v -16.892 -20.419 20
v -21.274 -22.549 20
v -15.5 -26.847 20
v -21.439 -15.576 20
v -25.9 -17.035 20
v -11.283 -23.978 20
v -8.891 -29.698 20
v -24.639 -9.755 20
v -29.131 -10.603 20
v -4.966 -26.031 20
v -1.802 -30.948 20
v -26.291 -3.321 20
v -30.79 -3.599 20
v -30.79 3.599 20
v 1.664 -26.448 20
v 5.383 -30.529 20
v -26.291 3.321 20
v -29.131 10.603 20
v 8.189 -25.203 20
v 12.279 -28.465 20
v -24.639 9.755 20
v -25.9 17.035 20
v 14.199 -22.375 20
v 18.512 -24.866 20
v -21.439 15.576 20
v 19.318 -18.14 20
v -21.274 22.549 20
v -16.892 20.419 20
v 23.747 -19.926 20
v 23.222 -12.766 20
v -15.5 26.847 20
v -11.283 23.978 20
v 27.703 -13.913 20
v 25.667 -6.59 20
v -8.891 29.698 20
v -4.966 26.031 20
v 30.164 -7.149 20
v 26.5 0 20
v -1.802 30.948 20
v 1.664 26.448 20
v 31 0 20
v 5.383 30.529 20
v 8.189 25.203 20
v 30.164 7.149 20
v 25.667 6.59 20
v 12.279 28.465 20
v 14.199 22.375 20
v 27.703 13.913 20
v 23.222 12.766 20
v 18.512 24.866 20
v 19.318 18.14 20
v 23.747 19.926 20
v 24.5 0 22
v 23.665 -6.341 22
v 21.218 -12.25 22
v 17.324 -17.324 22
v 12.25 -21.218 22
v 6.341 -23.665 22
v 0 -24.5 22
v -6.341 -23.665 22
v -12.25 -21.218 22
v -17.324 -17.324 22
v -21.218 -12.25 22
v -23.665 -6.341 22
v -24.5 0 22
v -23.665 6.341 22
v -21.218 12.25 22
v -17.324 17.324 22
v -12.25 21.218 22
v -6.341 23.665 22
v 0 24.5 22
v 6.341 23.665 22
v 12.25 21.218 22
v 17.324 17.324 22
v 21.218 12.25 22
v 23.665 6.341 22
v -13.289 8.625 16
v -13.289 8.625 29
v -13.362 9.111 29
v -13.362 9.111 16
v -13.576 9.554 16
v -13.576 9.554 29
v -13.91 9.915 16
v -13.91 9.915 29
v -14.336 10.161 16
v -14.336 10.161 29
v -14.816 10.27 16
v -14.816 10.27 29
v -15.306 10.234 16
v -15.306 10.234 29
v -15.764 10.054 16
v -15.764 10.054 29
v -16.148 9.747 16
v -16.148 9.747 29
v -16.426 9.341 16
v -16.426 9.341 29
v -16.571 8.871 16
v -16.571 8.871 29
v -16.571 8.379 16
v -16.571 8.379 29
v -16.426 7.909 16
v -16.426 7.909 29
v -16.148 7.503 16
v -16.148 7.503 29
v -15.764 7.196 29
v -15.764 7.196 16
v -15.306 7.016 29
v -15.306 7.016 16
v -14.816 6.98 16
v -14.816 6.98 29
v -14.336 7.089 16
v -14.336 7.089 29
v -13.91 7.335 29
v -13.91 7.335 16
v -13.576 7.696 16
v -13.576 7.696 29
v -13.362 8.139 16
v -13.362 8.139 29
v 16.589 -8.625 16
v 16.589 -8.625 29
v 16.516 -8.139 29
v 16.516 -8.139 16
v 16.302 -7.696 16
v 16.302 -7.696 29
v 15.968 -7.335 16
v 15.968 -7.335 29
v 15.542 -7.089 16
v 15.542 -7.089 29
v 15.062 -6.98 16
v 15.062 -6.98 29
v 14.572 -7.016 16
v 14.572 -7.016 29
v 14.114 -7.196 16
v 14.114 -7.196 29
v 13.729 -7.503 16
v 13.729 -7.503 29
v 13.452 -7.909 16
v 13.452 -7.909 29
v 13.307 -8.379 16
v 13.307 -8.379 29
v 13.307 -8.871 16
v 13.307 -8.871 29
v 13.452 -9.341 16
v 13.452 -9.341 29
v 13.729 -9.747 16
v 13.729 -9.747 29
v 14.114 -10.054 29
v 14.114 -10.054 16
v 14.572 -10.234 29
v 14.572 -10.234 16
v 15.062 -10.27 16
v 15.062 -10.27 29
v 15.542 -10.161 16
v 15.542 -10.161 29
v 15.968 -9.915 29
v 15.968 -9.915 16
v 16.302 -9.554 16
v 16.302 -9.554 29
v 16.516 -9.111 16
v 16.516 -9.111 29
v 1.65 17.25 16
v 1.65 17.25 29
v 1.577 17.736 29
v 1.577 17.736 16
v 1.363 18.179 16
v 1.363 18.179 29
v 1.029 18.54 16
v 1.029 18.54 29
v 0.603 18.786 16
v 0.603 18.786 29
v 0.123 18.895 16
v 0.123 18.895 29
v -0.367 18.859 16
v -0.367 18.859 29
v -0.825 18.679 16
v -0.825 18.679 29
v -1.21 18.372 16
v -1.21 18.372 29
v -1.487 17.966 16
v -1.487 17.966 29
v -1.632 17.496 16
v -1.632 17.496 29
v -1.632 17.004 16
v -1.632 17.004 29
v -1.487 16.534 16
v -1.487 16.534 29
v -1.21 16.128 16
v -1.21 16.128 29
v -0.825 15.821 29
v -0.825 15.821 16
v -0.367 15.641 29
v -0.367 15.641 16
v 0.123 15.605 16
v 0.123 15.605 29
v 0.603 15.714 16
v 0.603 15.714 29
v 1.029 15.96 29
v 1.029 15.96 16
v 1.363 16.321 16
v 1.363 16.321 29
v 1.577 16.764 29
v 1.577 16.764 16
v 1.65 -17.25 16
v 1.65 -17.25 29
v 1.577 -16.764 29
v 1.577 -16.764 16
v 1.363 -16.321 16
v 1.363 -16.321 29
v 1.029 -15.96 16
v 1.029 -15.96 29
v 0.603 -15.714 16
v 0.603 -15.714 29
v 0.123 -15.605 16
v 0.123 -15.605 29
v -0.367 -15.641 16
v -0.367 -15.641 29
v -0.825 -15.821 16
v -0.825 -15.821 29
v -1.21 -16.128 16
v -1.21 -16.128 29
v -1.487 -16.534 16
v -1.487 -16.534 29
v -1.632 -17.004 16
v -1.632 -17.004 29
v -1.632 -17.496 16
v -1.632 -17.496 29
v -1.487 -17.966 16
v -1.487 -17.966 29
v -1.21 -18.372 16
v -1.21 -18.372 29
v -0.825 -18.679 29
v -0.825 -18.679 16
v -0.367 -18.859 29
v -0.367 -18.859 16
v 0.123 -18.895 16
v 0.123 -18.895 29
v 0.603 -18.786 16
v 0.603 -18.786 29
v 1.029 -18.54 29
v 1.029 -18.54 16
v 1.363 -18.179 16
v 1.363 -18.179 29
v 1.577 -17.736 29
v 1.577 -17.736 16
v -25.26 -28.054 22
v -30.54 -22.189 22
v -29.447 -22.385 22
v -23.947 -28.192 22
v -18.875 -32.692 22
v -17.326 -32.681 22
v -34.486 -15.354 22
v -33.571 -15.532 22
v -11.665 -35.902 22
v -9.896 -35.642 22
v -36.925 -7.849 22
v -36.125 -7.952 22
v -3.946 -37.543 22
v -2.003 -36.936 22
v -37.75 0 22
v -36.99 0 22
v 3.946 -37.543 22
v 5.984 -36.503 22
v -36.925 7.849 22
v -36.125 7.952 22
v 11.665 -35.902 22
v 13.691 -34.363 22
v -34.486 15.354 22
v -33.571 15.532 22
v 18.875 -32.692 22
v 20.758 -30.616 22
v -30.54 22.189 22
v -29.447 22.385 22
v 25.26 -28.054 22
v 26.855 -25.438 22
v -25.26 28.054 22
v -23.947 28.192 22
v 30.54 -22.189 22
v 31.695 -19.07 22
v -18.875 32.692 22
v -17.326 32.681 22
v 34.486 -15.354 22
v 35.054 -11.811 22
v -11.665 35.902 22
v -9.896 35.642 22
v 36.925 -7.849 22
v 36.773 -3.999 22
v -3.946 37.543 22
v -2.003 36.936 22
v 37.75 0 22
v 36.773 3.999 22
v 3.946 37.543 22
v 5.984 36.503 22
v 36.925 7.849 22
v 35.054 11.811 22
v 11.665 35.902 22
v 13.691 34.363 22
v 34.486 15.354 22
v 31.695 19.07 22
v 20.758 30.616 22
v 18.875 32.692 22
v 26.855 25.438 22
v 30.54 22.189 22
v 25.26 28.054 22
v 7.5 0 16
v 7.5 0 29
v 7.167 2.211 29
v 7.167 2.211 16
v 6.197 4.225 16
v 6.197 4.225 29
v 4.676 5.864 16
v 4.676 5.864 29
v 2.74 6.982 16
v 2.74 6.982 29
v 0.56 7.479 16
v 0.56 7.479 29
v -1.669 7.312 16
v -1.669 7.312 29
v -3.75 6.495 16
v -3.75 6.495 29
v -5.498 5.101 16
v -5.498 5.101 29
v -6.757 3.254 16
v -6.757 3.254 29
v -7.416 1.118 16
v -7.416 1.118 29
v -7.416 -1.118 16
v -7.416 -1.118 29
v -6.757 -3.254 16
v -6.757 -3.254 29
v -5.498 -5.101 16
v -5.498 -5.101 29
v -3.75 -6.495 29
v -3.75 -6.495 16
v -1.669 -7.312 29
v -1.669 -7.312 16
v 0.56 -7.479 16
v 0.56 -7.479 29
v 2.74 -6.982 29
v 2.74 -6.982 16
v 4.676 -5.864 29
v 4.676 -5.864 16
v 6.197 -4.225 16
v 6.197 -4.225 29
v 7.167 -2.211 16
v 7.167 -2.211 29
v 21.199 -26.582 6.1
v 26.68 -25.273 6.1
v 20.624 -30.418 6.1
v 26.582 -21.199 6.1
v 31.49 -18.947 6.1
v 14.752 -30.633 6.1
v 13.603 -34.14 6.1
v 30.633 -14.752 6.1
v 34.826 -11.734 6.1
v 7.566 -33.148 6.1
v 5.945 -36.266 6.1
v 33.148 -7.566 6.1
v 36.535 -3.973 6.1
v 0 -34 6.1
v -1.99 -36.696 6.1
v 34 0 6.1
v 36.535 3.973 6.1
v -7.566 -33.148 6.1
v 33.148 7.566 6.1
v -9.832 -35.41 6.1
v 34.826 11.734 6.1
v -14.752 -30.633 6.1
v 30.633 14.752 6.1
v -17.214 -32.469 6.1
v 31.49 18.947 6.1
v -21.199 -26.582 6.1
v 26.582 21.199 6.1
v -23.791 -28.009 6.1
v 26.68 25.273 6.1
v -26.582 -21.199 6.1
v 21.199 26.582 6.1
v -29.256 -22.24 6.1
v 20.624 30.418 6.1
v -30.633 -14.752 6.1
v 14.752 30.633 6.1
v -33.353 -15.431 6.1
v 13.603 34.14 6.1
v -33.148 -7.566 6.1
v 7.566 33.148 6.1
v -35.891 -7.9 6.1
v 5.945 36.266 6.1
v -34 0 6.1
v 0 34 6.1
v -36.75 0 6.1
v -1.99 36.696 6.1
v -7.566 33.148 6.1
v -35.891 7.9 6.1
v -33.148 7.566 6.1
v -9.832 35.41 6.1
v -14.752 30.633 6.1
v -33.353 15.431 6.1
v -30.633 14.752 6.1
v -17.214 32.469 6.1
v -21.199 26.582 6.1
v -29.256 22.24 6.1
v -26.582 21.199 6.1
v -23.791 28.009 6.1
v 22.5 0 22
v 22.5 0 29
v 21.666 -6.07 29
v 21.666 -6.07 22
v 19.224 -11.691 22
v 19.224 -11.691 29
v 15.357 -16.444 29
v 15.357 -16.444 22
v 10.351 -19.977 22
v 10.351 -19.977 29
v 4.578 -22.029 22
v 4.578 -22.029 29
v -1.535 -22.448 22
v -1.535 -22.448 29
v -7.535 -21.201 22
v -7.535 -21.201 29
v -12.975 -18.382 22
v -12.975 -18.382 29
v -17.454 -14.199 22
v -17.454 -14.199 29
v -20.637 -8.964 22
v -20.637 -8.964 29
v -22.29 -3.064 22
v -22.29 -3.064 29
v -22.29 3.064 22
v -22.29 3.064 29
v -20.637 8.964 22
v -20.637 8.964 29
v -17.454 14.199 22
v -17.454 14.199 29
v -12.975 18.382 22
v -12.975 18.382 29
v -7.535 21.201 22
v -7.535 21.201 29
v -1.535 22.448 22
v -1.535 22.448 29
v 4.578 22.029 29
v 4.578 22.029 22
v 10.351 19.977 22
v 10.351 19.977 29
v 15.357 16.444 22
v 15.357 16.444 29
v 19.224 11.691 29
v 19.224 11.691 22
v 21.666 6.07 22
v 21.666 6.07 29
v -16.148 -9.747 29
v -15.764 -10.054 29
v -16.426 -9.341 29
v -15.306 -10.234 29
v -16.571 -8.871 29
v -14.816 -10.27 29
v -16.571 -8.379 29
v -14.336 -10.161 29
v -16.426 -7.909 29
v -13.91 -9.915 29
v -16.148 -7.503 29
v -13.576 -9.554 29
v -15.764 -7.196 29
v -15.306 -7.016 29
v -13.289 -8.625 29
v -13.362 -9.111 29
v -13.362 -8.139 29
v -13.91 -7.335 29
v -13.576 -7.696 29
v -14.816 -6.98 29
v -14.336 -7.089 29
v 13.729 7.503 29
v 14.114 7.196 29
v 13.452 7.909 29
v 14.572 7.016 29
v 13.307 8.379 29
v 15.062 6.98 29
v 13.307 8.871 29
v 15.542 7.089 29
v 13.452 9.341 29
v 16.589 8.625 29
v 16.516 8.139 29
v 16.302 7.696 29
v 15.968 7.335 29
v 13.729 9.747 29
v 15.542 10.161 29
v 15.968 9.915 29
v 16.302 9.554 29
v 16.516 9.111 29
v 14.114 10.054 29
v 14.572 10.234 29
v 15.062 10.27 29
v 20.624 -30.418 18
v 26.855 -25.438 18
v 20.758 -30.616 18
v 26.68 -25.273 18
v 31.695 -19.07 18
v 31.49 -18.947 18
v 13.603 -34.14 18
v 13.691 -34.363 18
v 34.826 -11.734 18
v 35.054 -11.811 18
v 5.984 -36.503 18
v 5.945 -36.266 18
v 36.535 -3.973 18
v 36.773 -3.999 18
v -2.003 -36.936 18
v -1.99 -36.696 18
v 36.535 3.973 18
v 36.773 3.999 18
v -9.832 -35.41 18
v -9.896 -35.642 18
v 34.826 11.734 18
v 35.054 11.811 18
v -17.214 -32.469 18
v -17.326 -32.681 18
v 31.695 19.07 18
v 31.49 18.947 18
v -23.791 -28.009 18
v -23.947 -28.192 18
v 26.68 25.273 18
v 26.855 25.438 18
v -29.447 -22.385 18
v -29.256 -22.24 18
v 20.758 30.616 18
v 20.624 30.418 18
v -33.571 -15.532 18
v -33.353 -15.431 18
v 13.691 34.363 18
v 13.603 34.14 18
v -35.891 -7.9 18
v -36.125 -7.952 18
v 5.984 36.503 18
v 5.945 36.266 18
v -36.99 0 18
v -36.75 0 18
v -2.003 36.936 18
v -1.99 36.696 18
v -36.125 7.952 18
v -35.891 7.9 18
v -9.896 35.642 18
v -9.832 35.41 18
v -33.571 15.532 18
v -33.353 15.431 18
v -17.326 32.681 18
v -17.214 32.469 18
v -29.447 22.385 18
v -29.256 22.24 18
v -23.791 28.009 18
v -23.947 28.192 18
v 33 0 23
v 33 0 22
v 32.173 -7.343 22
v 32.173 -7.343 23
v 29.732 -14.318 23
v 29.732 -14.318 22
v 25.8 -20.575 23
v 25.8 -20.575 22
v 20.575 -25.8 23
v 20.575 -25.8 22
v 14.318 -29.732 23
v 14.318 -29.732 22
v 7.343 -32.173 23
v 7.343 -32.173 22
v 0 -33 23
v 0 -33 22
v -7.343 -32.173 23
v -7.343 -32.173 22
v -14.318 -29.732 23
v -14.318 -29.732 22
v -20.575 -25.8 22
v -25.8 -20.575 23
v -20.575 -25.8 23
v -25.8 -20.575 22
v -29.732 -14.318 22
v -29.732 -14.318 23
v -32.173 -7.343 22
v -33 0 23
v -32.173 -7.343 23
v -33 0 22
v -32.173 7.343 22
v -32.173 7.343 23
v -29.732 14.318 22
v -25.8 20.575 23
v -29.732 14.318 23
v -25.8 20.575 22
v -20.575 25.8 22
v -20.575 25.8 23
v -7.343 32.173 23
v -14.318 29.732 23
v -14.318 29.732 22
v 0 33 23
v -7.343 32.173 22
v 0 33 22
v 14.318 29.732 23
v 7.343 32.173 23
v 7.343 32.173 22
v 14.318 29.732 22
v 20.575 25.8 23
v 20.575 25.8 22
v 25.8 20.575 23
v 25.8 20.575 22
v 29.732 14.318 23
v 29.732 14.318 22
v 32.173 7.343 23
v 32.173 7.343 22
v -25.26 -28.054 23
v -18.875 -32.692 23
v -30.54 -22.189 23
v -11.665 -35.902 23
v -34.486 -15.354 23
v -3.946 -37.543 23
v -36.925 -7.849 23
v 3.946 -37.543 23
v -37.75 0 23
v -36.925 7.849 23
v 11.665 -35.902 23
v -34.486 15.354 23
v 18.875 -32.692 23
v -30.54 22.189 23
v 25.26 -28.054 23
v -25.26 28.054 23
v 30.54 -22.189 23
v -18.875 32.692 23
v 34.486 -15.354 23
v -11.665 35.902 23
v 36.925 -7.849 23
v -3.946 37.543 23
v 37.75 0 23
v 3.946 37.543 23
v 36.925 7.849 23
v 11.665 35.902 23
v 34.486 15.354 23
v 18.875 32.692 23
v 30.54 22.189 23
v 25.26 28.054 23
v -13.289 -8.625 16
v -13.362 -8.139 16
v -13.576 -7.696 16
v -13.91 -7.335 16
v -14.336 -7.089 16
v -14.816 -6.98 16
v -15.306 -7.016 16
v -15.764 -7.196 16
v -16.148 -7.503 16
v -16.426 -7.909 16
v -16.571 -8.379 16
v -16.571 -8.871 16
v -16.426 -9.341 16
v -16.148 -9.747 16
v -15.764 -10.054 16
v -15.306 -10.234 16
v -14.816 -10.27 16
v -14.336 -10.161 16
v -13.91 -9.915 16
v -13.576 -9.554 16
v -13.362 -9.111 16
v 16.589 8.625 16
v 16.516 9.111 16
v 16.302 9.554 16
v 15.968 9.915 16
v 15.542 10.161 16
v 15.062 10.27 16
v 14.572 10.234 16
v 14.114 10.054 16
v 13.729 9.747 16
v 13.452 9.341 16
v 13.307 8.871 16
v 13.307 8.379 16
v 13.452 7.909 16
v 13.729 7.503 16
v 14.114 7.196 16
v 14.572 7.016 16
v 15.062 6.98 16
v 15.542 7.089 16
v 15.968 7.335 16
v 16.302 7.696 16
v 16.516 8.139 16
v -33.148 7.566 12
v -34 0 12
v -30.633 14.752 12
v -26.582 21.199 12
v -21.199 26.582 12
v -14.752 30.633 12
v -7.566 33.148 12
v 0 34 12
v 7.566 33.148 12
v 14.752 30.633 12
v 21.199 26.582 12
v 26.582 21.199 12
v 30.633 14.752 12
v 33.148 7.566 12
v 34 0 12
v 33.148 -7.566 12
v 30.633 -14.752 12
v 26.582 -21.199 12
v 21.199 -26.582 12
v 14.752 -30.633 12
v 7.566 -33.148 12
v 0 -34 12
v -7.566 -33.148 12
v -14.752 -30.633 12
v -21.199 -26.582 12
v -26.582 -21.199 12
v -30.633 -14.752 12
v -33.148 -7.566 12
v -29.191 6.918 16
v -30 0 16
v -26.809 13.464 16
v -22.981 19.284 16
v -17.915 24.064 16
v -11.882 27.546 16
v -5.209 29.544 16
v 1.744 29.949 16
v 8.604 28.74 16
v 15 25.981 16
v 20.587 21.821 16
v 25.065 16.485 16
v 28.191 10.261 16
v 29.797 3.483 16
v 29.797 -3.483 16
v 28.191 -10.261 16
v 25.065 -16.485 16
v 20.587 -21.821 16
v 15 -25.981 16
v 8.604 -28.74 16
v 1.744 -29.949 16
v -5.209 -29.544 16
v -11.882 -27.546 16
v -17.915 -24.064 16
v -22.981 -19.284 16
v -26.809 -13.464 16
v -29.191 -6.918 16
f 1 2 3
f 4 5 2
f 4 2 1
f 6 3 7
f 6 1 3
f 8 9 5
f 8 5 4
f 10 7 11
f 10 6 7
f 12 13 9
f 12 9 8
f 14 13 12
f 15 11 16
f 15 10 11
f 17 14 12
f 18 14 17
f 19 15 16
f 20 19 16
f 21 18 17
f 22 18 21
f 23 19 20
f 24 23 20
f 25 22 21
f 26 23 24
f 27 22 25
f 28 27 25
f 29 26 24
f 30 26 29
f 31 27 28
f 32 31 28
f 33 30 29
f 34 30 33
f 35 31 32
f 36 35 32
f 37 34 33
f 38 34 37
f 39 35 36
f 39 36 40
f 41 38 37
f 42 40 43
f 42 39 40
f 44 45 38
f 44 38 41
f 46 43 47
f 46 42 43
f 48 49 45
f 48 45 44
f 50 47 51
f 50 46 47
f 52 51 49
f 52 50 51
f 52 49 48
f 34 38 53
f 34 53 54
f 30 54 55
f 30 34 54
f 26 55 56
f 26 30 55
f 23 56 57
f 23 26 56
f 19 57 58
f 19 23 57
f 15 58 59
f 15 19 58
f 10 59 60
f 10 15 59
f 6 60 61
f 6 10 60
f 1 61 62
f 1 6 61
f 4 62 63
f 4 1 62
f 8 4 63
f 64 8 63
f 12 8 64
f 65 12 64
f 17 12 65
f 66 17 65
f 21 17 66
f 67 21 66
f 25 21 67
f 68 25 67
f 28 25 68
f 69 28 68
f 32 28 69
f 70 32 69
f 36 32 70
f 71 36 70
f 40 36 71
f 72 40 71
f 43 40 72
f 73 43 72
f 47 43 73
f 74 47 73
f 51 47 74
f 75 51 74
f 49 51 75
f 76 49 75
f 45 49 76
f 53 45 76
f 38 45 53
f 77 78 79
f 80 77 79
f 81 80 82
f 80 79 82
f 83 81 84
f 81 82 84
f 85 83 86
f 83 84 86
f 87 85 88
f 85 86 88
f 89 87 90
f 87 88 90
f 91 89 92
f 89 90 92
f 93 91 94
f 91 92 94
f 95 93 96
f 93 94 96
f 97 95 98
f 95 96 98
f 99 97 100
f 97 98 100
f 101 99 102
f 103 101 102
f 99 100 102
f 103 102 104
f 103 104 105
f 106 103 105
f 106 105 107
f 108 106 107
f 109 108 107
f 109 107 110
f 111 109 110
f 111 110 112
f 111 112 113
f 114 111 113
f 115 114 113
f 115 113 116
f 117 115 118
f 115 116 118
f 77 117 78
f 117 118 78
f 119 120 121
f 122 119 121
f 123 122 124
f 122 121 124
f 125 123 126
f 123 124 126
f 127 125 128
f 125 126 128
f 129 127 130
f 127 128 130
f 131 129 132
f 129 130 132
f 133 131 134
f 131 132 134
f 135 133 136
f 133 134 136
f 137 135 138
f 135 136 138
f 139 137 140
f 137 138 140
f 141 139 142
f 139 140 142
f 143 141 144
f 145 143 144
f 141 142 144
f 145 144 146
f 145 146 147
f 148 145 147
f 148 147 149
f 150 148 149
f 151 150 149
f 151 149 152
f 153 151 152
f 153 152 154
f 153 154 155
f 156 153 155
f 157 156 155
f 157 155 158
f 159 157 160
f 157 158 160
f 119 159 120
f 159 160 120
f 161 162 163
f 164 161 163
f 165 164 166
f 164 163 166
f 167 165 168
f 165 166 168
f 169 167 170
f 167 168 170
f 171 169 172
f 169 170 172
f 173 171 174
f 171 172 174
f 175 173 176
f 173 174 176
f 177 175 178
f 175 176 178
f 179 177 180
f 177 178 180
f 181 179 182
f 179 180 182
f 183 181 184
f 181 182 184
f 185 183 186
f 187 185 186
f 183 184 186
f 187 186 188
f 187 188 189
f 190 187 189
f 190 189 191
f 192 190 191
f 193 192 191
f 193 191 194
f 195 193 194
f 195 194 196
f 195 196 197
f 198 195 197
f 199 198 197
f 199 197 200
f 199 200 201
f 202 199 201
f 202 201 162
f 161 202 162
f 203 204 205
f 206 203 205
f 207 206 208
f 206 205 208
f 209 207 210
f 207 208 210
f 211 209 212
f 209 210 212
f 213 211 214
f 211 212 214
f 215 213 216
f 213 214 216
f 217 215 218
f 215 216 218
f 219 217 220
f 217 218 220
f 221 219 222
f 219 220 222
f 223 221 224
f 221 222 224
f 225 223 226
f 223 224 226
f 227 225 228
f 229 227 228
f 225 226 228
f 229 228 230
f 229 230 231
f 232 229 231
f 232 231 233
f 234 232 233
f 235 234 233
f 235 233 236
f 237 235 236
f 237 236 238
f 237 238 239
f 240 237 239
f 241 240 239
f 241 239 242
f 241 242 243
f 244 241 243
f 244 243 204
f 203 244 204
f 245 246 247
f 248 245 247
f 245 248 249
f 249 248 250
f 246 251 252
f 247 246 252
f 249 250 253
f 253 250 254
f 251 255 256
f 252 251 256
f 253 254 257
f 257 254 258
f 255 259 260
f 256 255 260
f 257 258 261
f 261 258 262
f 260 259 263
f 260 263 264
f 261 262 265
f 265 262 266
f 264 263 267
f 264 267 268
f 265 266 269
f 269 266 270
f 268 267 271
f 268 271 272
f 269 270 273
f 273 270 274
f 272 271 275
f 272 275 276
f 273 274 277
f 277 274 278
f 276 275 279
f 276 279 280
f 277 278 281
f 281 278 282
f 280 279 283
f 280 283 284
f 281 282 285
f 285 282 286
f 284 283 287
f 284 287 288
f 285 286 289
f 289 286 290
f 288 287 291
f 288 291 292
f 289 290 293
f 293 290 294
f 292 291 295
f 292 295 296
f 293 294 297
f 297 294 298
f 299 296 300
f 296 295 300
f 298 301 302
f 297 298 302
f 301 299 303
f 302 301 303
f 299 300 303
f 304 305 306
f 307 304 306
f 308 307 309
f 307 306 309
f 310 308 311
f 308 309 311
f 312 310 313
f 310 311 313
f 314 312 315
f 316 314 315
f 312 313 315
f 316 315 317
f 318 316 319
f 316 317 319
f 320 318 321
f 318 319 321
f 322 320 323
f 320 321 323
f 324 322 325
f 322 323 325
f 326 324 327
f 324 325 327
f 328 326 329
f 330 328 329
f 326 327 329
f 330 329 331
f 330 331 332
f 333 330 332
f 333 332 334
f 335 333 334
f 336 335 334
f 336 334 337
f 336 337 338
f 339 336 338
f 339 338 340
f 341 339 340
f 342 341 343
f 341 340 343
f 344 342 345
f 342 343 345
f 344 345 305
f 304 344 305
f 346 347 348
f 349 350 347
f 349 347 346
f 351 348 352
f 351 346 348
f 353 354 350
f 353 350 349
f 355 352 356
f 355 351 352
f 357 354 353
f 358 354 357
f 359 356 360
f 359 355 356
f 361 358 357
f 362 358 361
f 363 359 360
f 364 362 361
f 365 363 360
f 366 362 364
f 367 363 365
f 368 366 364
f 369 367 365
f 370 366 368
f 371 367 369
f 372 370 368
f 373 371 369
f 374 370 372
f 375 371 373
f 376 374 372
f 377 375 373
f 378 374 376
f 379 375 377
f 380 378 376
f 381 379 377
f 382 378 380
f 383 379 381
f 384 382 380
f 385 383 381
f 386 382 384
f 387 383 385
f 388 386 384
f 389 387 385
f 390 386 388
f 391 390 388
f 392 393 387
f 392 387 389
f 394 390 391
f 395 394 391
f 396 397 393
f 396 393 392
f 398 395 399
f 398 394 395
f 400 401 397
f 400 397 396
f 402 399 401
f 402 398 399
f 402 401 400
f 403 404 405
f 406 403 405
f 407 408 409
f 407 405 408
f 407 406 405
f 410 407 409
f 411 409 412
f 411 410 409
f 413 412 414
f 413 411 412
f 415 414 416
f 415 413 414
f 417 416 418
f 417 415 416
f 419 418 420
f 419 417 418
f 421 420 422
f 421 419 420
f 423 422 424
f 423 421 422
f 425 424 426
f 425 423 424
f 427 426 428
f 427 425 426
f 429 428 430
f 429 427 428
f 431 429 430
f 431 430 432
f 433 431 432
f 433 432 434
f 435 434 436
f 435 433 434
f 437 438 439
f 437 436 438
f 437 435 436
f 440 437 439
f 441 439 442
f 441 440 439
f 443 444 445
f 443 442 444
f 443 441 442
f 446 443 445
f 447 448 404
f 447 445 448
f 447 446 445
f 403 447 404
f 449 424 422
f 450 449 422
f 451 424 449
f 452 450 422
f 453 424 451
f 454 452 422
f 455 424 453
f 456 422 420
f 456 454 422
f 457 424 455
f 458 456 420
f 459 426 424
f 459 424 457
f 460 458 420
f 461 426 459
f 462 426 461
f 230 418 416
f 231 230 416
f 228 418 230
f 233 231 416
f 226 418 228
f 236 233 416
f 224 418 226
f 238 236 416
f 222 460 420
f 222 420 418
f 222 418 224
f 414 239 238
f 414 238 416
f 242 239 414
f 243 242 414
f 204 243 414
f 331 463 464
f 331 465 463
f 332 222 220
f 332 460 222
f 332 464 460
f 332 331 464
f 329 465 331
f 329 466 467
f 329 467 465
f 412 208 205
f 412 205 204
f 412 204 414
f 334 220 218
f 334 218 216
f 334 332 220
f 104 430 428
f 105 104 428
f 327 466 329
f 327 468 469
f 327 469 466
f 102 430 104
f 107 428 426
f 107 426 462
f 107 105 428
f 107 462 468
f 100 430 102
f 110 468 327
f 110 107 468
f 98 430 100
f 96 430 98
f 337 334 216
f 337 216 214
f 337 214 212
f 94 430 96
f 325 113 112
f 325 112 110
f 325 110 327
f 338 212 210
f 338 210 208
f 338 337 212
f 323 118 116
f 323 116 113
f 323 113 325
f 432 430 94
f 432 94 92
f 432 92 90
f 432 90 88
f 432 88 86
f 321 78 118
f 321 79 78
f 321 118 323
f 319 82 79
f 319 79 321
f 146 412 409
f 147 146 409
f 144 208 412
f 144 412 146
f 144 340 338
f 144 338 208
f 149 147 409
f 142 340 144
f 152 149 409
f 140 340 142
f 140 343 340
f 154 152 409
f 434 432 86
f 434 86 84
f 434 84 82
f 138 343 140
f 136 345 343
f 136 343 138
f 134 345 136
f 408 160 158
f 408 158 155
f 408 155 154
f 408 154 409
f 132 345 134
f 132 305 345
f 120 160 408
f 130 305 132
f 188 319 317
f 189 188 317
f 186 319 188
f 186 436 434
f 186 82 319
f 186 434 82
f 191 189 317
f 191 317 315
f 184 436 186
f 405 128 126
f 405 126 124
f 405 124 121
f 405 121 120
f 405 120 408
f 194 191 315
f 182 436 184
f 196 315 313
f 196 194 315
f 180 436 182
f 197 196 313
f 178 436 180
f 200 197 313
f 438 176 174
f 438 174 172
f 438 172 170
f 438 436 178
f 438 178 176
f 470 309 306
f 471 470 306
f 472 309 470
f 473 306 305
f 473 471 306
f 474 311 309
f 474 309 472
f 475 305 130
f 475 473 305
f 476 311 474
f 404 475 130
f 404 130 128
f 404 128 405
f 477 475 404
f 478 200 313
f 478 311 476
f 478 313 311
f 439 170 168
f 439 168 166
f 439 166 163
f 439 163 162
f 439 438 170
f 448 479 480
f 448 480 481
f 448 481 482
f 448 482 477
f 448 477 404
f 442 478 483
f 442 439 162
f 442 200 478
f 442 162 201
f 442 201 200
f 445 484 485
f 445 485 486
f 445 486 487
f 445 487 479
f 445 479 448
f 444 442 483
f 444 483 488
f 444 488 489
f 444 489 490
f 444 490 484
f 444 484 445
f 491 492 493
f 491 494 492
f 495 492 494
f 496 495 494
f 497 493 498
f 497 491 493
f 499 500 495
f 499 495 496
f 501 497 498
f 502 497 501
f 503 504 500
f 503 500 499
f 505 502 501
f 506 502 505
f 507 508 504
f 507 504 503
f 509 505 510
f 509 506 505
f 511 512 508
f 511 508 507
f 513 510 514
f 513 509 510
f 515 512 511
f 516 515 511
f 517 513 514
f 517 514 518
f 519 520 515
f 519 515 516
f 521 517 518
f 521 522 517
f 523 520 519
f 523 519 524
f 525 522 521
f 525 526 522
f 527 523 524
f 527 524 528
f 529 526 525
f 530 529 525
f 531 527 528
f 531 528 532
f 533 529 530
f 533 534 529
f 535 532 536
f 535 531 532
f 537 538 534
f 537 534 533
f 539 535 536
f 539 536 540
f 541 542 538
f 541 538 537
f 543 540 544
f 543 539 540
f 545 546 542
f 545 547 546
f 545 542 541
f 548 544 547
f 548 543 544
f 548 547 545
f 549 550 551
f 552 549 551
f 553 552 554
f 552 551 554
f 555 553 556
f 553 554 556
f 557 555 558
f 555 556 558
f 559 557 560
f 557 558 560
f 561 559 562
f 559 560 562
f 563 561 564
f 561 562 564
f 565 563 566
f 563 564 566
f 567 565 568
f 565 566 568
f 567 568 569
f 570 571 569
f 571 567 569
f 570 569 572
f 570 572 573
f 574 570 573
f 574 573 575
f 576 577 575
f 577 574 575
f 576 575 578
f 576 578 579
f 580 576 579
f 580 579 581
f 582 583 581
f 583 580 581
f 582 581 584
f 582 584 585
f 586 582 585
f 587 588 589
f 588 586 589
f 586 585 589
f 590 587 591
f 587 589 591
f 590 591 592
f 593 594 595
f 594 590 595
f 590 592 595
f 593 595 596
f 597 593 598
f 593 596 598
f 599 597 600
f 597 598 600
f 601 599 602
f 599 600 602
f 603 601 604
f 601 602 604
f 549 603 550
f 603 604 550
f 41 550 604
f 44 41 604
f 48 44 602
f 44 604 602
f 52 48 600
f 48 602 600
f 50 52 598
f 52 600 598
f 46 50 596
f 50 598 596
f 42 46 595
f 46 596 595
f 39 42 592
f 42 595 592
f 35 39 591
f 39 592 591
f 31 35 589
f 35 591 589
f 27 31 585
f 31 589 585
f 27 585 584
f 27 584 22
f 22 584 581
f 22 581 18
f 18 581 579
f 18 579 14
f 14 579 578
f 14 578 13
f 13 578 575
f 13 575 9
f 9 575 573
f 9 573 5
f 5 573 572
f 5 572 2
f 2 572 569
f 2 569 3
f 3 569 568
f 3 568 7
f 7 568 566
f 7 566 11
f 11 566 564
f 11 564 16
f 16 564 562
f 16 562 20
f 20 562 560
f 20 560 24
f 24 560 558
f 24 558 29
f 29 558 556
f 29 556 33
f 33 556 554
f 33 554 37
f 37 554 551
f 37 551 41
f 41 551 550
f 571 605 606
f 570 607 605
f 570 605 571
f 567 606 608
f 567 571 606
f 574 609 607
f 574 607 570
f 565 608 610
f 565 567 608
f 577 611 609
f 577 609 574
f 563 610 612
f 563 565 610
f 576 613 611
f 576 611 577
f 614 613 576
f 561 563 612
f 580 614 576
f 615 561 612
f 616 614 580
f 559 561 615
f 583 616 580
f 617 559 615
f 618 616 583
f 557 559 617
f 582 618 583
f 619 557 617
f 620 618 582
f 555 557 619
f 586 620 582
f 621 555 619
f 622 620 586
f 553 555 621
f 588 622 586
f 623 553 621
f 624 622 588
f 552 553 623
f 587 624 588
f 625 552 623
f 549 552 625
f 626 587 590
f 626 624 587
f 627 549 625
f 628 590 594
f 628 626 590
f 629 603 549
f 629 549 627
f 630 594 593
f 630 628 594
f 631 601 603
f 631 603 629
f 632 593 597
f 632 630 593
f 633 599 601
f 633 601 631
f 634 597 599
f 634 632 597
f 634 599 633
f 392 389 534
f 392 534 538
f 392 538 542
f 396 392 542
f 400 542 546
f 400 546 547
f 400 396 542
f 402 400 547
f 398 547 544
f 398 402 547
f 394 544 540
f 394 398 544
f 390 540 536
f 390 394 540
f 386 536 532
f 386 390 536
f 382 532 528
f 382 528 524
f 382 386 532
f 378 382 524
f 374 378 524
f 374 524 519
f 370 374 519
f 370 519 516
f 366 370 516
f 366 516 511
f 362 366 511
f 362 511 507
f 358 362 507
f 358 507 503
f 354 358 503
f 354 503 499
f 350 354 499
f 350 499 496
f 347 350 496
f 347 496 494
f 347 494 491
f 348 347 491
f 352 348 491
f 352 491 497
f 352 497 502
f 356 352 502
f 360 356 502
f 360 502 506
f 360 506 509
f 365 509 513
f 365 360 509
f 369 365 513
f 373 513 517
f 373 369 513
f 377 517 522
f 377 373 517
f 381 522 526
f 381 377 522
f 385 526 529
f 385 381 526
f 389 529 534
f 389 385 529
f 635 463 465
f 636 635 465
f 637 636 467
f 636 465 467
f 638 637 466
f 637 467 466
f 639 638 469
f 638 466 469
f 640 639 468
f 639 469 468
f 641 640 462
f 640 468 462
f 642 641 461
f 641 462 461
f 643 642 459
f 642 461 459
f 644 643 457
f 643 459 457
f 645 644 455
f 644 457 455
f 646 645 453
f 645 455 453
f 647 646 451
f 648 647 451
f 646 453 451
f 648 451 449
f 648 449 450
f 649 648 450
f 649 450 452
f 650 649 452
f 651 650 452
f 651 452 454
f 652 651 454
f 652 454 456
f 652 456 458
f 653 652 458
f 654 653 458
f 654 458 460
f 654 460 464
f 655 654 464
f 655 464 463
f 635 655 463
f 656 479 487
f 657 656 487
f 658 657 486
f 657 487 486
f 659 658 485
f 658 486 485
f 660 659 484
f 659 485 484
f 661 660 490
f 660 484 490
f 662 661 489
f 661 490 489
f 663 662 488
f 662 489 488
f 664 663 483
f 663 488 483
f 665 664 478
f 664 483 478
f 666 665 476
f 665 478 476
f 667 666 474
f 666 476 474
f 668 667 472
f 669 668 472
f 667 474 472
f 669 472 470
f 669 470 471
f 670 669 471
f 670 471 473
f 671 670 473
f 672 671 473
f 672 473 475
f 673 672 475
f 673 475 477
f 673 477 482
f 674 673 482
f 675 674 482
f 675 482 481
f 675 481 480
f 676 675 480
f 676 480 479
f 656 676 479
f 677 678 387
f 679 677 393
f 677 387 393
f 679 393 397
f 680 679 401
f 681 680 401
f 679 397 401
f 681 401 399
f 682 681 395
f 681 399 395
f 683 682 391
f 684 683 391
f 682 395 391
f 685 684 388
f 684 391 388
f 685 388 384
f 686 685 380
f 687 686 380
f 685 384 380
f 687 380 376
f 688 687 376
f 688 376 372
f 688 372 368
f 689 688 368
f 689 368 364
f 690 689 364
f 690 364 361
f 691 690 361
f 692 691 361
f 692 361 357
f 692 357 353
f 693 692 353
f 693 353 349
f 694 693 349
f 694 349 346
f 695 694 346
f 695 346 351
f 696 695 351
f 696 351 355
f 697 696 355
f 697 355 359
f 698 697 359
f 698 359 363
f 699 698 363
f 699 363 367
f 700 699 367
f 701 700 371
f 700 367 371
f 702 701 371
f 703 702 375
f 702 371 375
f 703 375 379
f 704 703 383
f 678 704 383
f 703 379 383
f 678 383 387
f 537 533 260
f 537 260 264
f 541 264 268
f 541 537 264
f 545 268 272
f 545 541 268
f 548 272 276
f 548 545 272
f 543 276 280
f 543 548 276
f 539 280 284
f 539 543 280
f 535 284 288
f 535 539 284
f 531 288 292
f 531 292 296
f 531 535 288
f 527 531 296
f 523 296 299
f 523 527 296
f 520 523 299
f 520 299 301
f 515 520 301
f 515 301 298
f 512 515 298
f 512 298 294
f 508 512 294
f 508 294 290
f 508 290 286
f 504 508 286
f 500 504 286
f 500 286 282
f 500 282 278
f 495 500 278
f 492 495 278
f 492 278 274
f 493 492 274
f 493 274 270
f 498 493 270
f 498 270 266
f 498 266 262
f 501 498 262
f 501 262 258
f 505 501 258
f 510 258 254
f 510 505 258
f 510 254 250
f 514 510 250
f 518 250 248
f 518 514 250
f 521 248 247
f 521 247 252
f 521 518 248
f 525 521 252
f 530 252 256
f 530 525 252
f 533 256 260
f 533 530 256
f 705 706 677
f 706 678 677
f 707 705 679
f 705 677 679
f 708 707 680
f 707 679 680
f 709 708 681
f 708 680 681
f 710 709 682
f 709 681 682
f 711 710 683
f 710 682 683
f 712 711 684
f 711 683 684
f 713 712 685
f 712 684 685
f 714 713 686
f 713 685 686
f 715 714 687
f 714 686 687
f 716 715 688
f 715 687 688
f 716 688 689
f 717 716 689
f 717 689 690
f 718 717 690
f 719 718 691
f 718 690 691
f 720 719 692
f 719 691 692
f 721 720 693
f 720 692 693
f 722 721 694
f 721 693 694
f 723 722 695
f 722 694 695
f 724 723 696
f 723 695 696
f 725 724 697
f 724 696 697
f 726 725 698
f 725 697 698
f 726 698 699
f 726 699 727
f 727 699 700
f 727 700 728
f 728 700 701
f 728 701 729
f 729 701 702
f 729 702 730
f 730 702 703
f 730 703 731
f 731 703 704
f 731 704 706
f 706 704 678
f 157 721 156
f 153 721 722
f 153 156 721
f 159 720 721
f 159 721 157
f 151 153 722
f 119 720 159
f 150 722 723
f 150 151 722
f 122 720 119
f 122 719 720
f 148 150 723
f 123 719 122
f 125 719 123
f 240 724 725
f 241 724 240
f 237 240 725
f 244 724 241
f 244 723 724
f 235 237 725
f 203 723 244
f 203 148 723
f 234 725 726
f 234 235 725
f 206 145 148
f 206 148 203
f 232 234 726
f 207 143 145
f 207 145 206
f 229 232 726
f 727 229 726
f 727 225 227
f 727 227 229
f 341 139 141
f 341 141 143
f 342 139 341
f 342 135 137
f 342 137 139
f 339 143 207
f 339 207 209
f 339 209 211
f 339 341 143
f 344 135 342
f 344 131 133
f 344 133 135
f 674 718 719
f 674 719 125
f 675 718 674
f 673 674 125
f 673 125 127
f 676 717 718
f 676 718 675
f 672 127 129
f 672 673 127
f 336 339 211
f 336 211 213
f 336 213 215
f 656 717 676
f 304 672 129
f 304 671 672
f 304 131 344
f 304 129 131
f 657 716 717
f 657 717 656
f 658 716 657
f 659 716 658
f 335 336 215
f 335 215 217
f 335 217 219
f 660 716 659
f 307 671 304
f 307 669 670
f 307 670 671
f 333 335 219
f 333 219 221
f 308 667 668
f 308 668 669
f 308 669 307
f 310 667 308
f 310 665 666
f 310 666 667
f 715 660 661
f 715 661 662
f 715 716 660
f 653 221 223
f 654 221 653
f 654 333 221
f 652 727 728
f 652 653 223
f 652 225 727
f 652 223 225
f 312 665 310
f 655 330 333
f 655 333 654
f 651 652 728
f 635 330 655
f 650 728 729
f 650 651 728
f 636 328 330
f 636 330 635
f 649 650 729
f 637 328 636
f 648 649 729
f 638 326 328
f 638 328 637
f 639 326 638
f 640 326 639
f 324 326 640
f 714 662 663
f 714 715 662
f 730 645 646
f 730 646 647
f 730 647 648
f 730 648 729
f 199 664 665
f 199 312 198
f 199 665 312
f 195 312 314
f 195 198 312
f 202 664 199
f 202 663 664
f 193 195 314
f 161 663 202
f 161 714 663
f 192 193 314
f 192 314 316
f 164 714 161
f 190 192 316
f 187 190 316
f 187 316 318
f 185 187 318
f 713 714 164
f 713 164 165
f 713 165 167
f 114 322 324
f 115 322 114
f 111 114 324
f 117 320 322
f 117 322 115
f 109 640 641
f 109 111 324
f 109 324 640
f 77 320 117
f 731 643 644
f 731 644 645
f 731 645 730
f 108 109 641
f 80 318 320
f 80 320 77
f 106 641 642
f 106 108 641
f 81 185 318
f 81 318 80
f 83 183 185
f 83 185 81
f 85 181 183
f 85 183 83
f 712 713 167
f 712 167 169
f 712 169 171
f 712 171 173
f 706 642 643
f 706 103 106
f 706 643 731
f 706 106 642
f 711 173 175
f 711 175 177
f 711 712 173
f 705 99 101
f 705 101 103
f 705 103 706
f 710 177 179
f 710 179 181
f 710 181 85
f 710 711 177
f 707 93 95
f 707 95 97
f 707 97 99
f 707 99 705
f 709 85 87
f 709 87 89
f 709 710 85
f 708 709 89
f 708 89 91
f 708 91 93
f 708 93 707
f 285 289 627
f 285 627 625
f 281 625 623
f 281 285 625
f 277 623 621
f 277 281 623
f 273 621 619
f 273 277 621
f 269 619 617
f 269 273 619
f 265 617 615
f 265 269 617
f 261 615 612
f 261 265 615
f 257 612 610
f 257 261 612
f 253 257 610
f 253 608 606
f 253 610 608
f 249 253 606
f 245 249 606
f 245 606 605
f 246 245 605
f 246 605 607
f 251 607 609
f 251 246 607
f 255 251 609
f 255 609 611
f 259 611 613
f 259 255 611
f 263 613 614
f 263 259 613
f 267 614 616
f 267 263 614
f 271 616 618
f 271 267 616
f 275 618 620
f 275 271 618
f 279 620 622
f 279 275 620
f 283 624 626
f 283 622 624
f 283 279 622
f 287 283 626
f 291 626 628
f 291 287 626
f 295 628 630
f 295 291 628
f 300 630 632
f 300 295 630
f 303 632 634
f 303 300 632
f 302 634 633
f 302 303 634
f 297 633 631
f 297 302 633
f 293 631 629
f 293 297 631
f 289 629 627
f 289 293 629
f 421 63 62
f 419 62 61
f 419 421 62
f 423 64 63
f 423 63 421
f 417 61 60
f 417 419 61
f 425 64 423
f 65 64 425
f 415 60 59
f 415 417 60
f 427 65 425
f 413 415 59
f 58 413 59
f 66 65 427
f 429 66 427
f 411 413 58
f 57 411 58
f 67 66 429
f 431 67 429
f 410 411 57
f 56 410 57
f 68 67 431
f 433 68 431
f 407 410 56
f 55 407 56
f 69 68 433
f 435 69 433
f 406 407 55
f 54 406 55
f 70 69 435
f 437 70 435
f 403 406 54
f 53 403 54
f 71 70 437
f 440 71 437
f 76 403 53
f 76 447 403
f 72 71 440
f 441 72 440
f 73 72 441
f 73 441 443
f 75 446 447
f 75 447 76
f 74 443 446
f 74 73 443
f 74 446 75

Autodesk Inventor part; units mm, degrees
ref_plane "YZ Plane" through (0, 0, 0) normal (1, 0, 0) x (0, 1, 0)
ref_plane "XZ Plane" through (0, 0, 0) normal (0, 1, 0) x (-1, 0, 0)
ref_plane "XY Plane" through (0, 0, 0) normal (0, 0, 1) x (1, 0, 0)
sketch "Sketch1" plane through (0, 0, 0) normal (0, 0, 1) x (1, 0, 0)
  circle A0 centre (0, 0) radius 37
  dimension "d0" = 74
extrude "Extrusion1" add sketch "Sketch1" along normal blind 22
sketch "Sketch2" plane through (0, 0, 22) normal (0, 0, 1) x (1, 0, 0)
  circle A0 centre (0, 0) radius 22.5
  dimension "d19" = 45
extrude "Extrusion2" add sketch "Sketch2" along normal blind 7
sketch "Sketch7" plane through (0, 0, 22) normal (0, 0, 1) x (1, 0, 0)
  circle A0 centre (0, 0) radius 22.5 projected
  circle A1 centre (0, 0) radius 24.5
  circle A2 centre (0, 0) radius 37 projected
  circle A3 centre (0, 0) radius 33
  dimension "d12" = 2
  dimension "d13" = 4
extrude "Extrusion5" cut sketch "Sketch7" against normal blind 2 contours A3
sketch "Sketch8" plane through (0, 0, 0) normal (0, 0, -1) x (-1, 0, 0)
  circle A0 centre (0, 0) radius 34
  circle A1 centre (0, 0) radius 37 projected
  dimension "d16" = 3
extrude "Extrusion6" cut sketch "Sketch8" against normal blind 16 contours A0
sketch "Sketch9" plane through (0, 0, 29) normal (0, 0, 1) x (1, 0, 0)
  circle A0 centre (0, 0) radius 7.5
  dimension "d20" = 15
extrude "Extrusion7" cut sketch "Sketch9" against normal blind 29
sketch "Sketch10" plane through (0, 0, 29) normal (0, 0, 1) x (1, 0, 0)
  circle A0 centre (0, 0) radius 17.25
  circle A1 centre (0, 17.25) radius 1.65
  circle A2 centre (-14.938938, 8.625) radius 1.65
  circle A3 centre (-14.938938, -8.625) radius 1.65
  circle A4 centre (0, -17.25) radius 1.65
  circle A5 centre (14.938938, -8.625) radius 1.65
  circle A6 centre (14.938938, 8.625) radius 1.65
  dimension "d23" = 34.5
  dimension "d24" = 3.3
  dimension "d27" = 360
extrude "Extrusion8" cut sketch "Sketch10" against normal through all contours A6 A0 | A0 A6 | A5 A0 | A0 A5 | A1 A0 | A0 A1 | A4 A0 | A0 A4 | A2 A0 | A0 A2 | A3 A0 | A0 A3
sketch "Sketch11" plane through (0, 0, 0) normal (0, 0, -1) x (-1, 0, 0)
  circle A0 centre (0, 0) radius 34 projected
  circle A1 centre (0, 0) radius 37 projected
extrude "Extrusion9" cut sketch "Sketch11" against normal blind 6
chamfer "Chamfer1" distance 4 angle 45 1 edges at (34, 0, 16)
sketch "Sketch12" plane through (0, 0, 22) normal (0, 0, 1) x (1, 0, 0)
  circle A0 centre (0, 0) radius 37 projected
  circle A1 centre (0, 0) radius 33 projected
  circle A2 centre (0, 0) radius 7.5 projected
  circle A3 centre (0, 0) radius 37.75
  dimension "d36" = 0.75
extrude "Extrusion10" add sketch "Sketch12" along normal blind 1 contours A0 | A2 | A3
chamfer "Chamfer3" distance 2 angle 45 2 edges at (-33, 0, 20) (-24.5, 0, 20)
sketch "Sketch14" plane through (0, 0, 6) normal (0, 0, -1) x (-1, 0, 0)
  circle A0 centre (0, 0) radius 37 projected
  circle A1 centre (0, 0) radius 34 projected
  circle A2 centre (0, 0) radius 36.75
  dimension "d47" = 0.25
sketch "Sketch14 outline for Extrusion12" plane through (0, 0, 6) normal (0, 0, -1) x (-1, 0, 0)
  circle A0 centre (0, 0) radius 37
  circle A1 centre (0, 0) radius 36.75
extrude "Extrusion12" cut sketch "Sketch14 outline for Extrusion12" against normal blind 12
sketch "Sketch15" plane through (0, 0, 18) normal (0, 0, -1) x (-1, 0, 0)
  circle A0 centre (0, 0) radius 37 projected
  circle A1 centre (0, 0) radius 36.75 projected
  circle A2 centre (0, 0) radius 36.99
  dimension "d50" = 0.01
sketch "Sketch15 outline for Extrusion13" plane through (0, 0, 18) normal (0, 0, -1) x (-1, 0, 0)
  circle A0 centre (0, 0) radius 37
  circle A1 centre (0, 0) radius 36.99
extrude "Extrusion13" cut sketch "Sketch15 outline for Extrusion13" against normal up to surface (4 mm away)
sketch "Sketch16" plane through (0, 0, 6) normal (0, 0, -1) x (-1, 0, 0)
  circle A0 centre (0, 0) radius 36.75 projected
  circle A1 centre (0, 0) radius 34 projected
extrude "Extrusion14" cut sketch "Sketch16" against normal blind 0.1
sketch "Sketch17" plane through (0, 0, 29) normal (0, 0, 1) x (1, 0, 0)
  circle A0 centre (0, 0) radius 7.5 projected
extrude "Extrusion15" cut sketch "Sketch17" against normal through all
properties part number "rotor_hub"
